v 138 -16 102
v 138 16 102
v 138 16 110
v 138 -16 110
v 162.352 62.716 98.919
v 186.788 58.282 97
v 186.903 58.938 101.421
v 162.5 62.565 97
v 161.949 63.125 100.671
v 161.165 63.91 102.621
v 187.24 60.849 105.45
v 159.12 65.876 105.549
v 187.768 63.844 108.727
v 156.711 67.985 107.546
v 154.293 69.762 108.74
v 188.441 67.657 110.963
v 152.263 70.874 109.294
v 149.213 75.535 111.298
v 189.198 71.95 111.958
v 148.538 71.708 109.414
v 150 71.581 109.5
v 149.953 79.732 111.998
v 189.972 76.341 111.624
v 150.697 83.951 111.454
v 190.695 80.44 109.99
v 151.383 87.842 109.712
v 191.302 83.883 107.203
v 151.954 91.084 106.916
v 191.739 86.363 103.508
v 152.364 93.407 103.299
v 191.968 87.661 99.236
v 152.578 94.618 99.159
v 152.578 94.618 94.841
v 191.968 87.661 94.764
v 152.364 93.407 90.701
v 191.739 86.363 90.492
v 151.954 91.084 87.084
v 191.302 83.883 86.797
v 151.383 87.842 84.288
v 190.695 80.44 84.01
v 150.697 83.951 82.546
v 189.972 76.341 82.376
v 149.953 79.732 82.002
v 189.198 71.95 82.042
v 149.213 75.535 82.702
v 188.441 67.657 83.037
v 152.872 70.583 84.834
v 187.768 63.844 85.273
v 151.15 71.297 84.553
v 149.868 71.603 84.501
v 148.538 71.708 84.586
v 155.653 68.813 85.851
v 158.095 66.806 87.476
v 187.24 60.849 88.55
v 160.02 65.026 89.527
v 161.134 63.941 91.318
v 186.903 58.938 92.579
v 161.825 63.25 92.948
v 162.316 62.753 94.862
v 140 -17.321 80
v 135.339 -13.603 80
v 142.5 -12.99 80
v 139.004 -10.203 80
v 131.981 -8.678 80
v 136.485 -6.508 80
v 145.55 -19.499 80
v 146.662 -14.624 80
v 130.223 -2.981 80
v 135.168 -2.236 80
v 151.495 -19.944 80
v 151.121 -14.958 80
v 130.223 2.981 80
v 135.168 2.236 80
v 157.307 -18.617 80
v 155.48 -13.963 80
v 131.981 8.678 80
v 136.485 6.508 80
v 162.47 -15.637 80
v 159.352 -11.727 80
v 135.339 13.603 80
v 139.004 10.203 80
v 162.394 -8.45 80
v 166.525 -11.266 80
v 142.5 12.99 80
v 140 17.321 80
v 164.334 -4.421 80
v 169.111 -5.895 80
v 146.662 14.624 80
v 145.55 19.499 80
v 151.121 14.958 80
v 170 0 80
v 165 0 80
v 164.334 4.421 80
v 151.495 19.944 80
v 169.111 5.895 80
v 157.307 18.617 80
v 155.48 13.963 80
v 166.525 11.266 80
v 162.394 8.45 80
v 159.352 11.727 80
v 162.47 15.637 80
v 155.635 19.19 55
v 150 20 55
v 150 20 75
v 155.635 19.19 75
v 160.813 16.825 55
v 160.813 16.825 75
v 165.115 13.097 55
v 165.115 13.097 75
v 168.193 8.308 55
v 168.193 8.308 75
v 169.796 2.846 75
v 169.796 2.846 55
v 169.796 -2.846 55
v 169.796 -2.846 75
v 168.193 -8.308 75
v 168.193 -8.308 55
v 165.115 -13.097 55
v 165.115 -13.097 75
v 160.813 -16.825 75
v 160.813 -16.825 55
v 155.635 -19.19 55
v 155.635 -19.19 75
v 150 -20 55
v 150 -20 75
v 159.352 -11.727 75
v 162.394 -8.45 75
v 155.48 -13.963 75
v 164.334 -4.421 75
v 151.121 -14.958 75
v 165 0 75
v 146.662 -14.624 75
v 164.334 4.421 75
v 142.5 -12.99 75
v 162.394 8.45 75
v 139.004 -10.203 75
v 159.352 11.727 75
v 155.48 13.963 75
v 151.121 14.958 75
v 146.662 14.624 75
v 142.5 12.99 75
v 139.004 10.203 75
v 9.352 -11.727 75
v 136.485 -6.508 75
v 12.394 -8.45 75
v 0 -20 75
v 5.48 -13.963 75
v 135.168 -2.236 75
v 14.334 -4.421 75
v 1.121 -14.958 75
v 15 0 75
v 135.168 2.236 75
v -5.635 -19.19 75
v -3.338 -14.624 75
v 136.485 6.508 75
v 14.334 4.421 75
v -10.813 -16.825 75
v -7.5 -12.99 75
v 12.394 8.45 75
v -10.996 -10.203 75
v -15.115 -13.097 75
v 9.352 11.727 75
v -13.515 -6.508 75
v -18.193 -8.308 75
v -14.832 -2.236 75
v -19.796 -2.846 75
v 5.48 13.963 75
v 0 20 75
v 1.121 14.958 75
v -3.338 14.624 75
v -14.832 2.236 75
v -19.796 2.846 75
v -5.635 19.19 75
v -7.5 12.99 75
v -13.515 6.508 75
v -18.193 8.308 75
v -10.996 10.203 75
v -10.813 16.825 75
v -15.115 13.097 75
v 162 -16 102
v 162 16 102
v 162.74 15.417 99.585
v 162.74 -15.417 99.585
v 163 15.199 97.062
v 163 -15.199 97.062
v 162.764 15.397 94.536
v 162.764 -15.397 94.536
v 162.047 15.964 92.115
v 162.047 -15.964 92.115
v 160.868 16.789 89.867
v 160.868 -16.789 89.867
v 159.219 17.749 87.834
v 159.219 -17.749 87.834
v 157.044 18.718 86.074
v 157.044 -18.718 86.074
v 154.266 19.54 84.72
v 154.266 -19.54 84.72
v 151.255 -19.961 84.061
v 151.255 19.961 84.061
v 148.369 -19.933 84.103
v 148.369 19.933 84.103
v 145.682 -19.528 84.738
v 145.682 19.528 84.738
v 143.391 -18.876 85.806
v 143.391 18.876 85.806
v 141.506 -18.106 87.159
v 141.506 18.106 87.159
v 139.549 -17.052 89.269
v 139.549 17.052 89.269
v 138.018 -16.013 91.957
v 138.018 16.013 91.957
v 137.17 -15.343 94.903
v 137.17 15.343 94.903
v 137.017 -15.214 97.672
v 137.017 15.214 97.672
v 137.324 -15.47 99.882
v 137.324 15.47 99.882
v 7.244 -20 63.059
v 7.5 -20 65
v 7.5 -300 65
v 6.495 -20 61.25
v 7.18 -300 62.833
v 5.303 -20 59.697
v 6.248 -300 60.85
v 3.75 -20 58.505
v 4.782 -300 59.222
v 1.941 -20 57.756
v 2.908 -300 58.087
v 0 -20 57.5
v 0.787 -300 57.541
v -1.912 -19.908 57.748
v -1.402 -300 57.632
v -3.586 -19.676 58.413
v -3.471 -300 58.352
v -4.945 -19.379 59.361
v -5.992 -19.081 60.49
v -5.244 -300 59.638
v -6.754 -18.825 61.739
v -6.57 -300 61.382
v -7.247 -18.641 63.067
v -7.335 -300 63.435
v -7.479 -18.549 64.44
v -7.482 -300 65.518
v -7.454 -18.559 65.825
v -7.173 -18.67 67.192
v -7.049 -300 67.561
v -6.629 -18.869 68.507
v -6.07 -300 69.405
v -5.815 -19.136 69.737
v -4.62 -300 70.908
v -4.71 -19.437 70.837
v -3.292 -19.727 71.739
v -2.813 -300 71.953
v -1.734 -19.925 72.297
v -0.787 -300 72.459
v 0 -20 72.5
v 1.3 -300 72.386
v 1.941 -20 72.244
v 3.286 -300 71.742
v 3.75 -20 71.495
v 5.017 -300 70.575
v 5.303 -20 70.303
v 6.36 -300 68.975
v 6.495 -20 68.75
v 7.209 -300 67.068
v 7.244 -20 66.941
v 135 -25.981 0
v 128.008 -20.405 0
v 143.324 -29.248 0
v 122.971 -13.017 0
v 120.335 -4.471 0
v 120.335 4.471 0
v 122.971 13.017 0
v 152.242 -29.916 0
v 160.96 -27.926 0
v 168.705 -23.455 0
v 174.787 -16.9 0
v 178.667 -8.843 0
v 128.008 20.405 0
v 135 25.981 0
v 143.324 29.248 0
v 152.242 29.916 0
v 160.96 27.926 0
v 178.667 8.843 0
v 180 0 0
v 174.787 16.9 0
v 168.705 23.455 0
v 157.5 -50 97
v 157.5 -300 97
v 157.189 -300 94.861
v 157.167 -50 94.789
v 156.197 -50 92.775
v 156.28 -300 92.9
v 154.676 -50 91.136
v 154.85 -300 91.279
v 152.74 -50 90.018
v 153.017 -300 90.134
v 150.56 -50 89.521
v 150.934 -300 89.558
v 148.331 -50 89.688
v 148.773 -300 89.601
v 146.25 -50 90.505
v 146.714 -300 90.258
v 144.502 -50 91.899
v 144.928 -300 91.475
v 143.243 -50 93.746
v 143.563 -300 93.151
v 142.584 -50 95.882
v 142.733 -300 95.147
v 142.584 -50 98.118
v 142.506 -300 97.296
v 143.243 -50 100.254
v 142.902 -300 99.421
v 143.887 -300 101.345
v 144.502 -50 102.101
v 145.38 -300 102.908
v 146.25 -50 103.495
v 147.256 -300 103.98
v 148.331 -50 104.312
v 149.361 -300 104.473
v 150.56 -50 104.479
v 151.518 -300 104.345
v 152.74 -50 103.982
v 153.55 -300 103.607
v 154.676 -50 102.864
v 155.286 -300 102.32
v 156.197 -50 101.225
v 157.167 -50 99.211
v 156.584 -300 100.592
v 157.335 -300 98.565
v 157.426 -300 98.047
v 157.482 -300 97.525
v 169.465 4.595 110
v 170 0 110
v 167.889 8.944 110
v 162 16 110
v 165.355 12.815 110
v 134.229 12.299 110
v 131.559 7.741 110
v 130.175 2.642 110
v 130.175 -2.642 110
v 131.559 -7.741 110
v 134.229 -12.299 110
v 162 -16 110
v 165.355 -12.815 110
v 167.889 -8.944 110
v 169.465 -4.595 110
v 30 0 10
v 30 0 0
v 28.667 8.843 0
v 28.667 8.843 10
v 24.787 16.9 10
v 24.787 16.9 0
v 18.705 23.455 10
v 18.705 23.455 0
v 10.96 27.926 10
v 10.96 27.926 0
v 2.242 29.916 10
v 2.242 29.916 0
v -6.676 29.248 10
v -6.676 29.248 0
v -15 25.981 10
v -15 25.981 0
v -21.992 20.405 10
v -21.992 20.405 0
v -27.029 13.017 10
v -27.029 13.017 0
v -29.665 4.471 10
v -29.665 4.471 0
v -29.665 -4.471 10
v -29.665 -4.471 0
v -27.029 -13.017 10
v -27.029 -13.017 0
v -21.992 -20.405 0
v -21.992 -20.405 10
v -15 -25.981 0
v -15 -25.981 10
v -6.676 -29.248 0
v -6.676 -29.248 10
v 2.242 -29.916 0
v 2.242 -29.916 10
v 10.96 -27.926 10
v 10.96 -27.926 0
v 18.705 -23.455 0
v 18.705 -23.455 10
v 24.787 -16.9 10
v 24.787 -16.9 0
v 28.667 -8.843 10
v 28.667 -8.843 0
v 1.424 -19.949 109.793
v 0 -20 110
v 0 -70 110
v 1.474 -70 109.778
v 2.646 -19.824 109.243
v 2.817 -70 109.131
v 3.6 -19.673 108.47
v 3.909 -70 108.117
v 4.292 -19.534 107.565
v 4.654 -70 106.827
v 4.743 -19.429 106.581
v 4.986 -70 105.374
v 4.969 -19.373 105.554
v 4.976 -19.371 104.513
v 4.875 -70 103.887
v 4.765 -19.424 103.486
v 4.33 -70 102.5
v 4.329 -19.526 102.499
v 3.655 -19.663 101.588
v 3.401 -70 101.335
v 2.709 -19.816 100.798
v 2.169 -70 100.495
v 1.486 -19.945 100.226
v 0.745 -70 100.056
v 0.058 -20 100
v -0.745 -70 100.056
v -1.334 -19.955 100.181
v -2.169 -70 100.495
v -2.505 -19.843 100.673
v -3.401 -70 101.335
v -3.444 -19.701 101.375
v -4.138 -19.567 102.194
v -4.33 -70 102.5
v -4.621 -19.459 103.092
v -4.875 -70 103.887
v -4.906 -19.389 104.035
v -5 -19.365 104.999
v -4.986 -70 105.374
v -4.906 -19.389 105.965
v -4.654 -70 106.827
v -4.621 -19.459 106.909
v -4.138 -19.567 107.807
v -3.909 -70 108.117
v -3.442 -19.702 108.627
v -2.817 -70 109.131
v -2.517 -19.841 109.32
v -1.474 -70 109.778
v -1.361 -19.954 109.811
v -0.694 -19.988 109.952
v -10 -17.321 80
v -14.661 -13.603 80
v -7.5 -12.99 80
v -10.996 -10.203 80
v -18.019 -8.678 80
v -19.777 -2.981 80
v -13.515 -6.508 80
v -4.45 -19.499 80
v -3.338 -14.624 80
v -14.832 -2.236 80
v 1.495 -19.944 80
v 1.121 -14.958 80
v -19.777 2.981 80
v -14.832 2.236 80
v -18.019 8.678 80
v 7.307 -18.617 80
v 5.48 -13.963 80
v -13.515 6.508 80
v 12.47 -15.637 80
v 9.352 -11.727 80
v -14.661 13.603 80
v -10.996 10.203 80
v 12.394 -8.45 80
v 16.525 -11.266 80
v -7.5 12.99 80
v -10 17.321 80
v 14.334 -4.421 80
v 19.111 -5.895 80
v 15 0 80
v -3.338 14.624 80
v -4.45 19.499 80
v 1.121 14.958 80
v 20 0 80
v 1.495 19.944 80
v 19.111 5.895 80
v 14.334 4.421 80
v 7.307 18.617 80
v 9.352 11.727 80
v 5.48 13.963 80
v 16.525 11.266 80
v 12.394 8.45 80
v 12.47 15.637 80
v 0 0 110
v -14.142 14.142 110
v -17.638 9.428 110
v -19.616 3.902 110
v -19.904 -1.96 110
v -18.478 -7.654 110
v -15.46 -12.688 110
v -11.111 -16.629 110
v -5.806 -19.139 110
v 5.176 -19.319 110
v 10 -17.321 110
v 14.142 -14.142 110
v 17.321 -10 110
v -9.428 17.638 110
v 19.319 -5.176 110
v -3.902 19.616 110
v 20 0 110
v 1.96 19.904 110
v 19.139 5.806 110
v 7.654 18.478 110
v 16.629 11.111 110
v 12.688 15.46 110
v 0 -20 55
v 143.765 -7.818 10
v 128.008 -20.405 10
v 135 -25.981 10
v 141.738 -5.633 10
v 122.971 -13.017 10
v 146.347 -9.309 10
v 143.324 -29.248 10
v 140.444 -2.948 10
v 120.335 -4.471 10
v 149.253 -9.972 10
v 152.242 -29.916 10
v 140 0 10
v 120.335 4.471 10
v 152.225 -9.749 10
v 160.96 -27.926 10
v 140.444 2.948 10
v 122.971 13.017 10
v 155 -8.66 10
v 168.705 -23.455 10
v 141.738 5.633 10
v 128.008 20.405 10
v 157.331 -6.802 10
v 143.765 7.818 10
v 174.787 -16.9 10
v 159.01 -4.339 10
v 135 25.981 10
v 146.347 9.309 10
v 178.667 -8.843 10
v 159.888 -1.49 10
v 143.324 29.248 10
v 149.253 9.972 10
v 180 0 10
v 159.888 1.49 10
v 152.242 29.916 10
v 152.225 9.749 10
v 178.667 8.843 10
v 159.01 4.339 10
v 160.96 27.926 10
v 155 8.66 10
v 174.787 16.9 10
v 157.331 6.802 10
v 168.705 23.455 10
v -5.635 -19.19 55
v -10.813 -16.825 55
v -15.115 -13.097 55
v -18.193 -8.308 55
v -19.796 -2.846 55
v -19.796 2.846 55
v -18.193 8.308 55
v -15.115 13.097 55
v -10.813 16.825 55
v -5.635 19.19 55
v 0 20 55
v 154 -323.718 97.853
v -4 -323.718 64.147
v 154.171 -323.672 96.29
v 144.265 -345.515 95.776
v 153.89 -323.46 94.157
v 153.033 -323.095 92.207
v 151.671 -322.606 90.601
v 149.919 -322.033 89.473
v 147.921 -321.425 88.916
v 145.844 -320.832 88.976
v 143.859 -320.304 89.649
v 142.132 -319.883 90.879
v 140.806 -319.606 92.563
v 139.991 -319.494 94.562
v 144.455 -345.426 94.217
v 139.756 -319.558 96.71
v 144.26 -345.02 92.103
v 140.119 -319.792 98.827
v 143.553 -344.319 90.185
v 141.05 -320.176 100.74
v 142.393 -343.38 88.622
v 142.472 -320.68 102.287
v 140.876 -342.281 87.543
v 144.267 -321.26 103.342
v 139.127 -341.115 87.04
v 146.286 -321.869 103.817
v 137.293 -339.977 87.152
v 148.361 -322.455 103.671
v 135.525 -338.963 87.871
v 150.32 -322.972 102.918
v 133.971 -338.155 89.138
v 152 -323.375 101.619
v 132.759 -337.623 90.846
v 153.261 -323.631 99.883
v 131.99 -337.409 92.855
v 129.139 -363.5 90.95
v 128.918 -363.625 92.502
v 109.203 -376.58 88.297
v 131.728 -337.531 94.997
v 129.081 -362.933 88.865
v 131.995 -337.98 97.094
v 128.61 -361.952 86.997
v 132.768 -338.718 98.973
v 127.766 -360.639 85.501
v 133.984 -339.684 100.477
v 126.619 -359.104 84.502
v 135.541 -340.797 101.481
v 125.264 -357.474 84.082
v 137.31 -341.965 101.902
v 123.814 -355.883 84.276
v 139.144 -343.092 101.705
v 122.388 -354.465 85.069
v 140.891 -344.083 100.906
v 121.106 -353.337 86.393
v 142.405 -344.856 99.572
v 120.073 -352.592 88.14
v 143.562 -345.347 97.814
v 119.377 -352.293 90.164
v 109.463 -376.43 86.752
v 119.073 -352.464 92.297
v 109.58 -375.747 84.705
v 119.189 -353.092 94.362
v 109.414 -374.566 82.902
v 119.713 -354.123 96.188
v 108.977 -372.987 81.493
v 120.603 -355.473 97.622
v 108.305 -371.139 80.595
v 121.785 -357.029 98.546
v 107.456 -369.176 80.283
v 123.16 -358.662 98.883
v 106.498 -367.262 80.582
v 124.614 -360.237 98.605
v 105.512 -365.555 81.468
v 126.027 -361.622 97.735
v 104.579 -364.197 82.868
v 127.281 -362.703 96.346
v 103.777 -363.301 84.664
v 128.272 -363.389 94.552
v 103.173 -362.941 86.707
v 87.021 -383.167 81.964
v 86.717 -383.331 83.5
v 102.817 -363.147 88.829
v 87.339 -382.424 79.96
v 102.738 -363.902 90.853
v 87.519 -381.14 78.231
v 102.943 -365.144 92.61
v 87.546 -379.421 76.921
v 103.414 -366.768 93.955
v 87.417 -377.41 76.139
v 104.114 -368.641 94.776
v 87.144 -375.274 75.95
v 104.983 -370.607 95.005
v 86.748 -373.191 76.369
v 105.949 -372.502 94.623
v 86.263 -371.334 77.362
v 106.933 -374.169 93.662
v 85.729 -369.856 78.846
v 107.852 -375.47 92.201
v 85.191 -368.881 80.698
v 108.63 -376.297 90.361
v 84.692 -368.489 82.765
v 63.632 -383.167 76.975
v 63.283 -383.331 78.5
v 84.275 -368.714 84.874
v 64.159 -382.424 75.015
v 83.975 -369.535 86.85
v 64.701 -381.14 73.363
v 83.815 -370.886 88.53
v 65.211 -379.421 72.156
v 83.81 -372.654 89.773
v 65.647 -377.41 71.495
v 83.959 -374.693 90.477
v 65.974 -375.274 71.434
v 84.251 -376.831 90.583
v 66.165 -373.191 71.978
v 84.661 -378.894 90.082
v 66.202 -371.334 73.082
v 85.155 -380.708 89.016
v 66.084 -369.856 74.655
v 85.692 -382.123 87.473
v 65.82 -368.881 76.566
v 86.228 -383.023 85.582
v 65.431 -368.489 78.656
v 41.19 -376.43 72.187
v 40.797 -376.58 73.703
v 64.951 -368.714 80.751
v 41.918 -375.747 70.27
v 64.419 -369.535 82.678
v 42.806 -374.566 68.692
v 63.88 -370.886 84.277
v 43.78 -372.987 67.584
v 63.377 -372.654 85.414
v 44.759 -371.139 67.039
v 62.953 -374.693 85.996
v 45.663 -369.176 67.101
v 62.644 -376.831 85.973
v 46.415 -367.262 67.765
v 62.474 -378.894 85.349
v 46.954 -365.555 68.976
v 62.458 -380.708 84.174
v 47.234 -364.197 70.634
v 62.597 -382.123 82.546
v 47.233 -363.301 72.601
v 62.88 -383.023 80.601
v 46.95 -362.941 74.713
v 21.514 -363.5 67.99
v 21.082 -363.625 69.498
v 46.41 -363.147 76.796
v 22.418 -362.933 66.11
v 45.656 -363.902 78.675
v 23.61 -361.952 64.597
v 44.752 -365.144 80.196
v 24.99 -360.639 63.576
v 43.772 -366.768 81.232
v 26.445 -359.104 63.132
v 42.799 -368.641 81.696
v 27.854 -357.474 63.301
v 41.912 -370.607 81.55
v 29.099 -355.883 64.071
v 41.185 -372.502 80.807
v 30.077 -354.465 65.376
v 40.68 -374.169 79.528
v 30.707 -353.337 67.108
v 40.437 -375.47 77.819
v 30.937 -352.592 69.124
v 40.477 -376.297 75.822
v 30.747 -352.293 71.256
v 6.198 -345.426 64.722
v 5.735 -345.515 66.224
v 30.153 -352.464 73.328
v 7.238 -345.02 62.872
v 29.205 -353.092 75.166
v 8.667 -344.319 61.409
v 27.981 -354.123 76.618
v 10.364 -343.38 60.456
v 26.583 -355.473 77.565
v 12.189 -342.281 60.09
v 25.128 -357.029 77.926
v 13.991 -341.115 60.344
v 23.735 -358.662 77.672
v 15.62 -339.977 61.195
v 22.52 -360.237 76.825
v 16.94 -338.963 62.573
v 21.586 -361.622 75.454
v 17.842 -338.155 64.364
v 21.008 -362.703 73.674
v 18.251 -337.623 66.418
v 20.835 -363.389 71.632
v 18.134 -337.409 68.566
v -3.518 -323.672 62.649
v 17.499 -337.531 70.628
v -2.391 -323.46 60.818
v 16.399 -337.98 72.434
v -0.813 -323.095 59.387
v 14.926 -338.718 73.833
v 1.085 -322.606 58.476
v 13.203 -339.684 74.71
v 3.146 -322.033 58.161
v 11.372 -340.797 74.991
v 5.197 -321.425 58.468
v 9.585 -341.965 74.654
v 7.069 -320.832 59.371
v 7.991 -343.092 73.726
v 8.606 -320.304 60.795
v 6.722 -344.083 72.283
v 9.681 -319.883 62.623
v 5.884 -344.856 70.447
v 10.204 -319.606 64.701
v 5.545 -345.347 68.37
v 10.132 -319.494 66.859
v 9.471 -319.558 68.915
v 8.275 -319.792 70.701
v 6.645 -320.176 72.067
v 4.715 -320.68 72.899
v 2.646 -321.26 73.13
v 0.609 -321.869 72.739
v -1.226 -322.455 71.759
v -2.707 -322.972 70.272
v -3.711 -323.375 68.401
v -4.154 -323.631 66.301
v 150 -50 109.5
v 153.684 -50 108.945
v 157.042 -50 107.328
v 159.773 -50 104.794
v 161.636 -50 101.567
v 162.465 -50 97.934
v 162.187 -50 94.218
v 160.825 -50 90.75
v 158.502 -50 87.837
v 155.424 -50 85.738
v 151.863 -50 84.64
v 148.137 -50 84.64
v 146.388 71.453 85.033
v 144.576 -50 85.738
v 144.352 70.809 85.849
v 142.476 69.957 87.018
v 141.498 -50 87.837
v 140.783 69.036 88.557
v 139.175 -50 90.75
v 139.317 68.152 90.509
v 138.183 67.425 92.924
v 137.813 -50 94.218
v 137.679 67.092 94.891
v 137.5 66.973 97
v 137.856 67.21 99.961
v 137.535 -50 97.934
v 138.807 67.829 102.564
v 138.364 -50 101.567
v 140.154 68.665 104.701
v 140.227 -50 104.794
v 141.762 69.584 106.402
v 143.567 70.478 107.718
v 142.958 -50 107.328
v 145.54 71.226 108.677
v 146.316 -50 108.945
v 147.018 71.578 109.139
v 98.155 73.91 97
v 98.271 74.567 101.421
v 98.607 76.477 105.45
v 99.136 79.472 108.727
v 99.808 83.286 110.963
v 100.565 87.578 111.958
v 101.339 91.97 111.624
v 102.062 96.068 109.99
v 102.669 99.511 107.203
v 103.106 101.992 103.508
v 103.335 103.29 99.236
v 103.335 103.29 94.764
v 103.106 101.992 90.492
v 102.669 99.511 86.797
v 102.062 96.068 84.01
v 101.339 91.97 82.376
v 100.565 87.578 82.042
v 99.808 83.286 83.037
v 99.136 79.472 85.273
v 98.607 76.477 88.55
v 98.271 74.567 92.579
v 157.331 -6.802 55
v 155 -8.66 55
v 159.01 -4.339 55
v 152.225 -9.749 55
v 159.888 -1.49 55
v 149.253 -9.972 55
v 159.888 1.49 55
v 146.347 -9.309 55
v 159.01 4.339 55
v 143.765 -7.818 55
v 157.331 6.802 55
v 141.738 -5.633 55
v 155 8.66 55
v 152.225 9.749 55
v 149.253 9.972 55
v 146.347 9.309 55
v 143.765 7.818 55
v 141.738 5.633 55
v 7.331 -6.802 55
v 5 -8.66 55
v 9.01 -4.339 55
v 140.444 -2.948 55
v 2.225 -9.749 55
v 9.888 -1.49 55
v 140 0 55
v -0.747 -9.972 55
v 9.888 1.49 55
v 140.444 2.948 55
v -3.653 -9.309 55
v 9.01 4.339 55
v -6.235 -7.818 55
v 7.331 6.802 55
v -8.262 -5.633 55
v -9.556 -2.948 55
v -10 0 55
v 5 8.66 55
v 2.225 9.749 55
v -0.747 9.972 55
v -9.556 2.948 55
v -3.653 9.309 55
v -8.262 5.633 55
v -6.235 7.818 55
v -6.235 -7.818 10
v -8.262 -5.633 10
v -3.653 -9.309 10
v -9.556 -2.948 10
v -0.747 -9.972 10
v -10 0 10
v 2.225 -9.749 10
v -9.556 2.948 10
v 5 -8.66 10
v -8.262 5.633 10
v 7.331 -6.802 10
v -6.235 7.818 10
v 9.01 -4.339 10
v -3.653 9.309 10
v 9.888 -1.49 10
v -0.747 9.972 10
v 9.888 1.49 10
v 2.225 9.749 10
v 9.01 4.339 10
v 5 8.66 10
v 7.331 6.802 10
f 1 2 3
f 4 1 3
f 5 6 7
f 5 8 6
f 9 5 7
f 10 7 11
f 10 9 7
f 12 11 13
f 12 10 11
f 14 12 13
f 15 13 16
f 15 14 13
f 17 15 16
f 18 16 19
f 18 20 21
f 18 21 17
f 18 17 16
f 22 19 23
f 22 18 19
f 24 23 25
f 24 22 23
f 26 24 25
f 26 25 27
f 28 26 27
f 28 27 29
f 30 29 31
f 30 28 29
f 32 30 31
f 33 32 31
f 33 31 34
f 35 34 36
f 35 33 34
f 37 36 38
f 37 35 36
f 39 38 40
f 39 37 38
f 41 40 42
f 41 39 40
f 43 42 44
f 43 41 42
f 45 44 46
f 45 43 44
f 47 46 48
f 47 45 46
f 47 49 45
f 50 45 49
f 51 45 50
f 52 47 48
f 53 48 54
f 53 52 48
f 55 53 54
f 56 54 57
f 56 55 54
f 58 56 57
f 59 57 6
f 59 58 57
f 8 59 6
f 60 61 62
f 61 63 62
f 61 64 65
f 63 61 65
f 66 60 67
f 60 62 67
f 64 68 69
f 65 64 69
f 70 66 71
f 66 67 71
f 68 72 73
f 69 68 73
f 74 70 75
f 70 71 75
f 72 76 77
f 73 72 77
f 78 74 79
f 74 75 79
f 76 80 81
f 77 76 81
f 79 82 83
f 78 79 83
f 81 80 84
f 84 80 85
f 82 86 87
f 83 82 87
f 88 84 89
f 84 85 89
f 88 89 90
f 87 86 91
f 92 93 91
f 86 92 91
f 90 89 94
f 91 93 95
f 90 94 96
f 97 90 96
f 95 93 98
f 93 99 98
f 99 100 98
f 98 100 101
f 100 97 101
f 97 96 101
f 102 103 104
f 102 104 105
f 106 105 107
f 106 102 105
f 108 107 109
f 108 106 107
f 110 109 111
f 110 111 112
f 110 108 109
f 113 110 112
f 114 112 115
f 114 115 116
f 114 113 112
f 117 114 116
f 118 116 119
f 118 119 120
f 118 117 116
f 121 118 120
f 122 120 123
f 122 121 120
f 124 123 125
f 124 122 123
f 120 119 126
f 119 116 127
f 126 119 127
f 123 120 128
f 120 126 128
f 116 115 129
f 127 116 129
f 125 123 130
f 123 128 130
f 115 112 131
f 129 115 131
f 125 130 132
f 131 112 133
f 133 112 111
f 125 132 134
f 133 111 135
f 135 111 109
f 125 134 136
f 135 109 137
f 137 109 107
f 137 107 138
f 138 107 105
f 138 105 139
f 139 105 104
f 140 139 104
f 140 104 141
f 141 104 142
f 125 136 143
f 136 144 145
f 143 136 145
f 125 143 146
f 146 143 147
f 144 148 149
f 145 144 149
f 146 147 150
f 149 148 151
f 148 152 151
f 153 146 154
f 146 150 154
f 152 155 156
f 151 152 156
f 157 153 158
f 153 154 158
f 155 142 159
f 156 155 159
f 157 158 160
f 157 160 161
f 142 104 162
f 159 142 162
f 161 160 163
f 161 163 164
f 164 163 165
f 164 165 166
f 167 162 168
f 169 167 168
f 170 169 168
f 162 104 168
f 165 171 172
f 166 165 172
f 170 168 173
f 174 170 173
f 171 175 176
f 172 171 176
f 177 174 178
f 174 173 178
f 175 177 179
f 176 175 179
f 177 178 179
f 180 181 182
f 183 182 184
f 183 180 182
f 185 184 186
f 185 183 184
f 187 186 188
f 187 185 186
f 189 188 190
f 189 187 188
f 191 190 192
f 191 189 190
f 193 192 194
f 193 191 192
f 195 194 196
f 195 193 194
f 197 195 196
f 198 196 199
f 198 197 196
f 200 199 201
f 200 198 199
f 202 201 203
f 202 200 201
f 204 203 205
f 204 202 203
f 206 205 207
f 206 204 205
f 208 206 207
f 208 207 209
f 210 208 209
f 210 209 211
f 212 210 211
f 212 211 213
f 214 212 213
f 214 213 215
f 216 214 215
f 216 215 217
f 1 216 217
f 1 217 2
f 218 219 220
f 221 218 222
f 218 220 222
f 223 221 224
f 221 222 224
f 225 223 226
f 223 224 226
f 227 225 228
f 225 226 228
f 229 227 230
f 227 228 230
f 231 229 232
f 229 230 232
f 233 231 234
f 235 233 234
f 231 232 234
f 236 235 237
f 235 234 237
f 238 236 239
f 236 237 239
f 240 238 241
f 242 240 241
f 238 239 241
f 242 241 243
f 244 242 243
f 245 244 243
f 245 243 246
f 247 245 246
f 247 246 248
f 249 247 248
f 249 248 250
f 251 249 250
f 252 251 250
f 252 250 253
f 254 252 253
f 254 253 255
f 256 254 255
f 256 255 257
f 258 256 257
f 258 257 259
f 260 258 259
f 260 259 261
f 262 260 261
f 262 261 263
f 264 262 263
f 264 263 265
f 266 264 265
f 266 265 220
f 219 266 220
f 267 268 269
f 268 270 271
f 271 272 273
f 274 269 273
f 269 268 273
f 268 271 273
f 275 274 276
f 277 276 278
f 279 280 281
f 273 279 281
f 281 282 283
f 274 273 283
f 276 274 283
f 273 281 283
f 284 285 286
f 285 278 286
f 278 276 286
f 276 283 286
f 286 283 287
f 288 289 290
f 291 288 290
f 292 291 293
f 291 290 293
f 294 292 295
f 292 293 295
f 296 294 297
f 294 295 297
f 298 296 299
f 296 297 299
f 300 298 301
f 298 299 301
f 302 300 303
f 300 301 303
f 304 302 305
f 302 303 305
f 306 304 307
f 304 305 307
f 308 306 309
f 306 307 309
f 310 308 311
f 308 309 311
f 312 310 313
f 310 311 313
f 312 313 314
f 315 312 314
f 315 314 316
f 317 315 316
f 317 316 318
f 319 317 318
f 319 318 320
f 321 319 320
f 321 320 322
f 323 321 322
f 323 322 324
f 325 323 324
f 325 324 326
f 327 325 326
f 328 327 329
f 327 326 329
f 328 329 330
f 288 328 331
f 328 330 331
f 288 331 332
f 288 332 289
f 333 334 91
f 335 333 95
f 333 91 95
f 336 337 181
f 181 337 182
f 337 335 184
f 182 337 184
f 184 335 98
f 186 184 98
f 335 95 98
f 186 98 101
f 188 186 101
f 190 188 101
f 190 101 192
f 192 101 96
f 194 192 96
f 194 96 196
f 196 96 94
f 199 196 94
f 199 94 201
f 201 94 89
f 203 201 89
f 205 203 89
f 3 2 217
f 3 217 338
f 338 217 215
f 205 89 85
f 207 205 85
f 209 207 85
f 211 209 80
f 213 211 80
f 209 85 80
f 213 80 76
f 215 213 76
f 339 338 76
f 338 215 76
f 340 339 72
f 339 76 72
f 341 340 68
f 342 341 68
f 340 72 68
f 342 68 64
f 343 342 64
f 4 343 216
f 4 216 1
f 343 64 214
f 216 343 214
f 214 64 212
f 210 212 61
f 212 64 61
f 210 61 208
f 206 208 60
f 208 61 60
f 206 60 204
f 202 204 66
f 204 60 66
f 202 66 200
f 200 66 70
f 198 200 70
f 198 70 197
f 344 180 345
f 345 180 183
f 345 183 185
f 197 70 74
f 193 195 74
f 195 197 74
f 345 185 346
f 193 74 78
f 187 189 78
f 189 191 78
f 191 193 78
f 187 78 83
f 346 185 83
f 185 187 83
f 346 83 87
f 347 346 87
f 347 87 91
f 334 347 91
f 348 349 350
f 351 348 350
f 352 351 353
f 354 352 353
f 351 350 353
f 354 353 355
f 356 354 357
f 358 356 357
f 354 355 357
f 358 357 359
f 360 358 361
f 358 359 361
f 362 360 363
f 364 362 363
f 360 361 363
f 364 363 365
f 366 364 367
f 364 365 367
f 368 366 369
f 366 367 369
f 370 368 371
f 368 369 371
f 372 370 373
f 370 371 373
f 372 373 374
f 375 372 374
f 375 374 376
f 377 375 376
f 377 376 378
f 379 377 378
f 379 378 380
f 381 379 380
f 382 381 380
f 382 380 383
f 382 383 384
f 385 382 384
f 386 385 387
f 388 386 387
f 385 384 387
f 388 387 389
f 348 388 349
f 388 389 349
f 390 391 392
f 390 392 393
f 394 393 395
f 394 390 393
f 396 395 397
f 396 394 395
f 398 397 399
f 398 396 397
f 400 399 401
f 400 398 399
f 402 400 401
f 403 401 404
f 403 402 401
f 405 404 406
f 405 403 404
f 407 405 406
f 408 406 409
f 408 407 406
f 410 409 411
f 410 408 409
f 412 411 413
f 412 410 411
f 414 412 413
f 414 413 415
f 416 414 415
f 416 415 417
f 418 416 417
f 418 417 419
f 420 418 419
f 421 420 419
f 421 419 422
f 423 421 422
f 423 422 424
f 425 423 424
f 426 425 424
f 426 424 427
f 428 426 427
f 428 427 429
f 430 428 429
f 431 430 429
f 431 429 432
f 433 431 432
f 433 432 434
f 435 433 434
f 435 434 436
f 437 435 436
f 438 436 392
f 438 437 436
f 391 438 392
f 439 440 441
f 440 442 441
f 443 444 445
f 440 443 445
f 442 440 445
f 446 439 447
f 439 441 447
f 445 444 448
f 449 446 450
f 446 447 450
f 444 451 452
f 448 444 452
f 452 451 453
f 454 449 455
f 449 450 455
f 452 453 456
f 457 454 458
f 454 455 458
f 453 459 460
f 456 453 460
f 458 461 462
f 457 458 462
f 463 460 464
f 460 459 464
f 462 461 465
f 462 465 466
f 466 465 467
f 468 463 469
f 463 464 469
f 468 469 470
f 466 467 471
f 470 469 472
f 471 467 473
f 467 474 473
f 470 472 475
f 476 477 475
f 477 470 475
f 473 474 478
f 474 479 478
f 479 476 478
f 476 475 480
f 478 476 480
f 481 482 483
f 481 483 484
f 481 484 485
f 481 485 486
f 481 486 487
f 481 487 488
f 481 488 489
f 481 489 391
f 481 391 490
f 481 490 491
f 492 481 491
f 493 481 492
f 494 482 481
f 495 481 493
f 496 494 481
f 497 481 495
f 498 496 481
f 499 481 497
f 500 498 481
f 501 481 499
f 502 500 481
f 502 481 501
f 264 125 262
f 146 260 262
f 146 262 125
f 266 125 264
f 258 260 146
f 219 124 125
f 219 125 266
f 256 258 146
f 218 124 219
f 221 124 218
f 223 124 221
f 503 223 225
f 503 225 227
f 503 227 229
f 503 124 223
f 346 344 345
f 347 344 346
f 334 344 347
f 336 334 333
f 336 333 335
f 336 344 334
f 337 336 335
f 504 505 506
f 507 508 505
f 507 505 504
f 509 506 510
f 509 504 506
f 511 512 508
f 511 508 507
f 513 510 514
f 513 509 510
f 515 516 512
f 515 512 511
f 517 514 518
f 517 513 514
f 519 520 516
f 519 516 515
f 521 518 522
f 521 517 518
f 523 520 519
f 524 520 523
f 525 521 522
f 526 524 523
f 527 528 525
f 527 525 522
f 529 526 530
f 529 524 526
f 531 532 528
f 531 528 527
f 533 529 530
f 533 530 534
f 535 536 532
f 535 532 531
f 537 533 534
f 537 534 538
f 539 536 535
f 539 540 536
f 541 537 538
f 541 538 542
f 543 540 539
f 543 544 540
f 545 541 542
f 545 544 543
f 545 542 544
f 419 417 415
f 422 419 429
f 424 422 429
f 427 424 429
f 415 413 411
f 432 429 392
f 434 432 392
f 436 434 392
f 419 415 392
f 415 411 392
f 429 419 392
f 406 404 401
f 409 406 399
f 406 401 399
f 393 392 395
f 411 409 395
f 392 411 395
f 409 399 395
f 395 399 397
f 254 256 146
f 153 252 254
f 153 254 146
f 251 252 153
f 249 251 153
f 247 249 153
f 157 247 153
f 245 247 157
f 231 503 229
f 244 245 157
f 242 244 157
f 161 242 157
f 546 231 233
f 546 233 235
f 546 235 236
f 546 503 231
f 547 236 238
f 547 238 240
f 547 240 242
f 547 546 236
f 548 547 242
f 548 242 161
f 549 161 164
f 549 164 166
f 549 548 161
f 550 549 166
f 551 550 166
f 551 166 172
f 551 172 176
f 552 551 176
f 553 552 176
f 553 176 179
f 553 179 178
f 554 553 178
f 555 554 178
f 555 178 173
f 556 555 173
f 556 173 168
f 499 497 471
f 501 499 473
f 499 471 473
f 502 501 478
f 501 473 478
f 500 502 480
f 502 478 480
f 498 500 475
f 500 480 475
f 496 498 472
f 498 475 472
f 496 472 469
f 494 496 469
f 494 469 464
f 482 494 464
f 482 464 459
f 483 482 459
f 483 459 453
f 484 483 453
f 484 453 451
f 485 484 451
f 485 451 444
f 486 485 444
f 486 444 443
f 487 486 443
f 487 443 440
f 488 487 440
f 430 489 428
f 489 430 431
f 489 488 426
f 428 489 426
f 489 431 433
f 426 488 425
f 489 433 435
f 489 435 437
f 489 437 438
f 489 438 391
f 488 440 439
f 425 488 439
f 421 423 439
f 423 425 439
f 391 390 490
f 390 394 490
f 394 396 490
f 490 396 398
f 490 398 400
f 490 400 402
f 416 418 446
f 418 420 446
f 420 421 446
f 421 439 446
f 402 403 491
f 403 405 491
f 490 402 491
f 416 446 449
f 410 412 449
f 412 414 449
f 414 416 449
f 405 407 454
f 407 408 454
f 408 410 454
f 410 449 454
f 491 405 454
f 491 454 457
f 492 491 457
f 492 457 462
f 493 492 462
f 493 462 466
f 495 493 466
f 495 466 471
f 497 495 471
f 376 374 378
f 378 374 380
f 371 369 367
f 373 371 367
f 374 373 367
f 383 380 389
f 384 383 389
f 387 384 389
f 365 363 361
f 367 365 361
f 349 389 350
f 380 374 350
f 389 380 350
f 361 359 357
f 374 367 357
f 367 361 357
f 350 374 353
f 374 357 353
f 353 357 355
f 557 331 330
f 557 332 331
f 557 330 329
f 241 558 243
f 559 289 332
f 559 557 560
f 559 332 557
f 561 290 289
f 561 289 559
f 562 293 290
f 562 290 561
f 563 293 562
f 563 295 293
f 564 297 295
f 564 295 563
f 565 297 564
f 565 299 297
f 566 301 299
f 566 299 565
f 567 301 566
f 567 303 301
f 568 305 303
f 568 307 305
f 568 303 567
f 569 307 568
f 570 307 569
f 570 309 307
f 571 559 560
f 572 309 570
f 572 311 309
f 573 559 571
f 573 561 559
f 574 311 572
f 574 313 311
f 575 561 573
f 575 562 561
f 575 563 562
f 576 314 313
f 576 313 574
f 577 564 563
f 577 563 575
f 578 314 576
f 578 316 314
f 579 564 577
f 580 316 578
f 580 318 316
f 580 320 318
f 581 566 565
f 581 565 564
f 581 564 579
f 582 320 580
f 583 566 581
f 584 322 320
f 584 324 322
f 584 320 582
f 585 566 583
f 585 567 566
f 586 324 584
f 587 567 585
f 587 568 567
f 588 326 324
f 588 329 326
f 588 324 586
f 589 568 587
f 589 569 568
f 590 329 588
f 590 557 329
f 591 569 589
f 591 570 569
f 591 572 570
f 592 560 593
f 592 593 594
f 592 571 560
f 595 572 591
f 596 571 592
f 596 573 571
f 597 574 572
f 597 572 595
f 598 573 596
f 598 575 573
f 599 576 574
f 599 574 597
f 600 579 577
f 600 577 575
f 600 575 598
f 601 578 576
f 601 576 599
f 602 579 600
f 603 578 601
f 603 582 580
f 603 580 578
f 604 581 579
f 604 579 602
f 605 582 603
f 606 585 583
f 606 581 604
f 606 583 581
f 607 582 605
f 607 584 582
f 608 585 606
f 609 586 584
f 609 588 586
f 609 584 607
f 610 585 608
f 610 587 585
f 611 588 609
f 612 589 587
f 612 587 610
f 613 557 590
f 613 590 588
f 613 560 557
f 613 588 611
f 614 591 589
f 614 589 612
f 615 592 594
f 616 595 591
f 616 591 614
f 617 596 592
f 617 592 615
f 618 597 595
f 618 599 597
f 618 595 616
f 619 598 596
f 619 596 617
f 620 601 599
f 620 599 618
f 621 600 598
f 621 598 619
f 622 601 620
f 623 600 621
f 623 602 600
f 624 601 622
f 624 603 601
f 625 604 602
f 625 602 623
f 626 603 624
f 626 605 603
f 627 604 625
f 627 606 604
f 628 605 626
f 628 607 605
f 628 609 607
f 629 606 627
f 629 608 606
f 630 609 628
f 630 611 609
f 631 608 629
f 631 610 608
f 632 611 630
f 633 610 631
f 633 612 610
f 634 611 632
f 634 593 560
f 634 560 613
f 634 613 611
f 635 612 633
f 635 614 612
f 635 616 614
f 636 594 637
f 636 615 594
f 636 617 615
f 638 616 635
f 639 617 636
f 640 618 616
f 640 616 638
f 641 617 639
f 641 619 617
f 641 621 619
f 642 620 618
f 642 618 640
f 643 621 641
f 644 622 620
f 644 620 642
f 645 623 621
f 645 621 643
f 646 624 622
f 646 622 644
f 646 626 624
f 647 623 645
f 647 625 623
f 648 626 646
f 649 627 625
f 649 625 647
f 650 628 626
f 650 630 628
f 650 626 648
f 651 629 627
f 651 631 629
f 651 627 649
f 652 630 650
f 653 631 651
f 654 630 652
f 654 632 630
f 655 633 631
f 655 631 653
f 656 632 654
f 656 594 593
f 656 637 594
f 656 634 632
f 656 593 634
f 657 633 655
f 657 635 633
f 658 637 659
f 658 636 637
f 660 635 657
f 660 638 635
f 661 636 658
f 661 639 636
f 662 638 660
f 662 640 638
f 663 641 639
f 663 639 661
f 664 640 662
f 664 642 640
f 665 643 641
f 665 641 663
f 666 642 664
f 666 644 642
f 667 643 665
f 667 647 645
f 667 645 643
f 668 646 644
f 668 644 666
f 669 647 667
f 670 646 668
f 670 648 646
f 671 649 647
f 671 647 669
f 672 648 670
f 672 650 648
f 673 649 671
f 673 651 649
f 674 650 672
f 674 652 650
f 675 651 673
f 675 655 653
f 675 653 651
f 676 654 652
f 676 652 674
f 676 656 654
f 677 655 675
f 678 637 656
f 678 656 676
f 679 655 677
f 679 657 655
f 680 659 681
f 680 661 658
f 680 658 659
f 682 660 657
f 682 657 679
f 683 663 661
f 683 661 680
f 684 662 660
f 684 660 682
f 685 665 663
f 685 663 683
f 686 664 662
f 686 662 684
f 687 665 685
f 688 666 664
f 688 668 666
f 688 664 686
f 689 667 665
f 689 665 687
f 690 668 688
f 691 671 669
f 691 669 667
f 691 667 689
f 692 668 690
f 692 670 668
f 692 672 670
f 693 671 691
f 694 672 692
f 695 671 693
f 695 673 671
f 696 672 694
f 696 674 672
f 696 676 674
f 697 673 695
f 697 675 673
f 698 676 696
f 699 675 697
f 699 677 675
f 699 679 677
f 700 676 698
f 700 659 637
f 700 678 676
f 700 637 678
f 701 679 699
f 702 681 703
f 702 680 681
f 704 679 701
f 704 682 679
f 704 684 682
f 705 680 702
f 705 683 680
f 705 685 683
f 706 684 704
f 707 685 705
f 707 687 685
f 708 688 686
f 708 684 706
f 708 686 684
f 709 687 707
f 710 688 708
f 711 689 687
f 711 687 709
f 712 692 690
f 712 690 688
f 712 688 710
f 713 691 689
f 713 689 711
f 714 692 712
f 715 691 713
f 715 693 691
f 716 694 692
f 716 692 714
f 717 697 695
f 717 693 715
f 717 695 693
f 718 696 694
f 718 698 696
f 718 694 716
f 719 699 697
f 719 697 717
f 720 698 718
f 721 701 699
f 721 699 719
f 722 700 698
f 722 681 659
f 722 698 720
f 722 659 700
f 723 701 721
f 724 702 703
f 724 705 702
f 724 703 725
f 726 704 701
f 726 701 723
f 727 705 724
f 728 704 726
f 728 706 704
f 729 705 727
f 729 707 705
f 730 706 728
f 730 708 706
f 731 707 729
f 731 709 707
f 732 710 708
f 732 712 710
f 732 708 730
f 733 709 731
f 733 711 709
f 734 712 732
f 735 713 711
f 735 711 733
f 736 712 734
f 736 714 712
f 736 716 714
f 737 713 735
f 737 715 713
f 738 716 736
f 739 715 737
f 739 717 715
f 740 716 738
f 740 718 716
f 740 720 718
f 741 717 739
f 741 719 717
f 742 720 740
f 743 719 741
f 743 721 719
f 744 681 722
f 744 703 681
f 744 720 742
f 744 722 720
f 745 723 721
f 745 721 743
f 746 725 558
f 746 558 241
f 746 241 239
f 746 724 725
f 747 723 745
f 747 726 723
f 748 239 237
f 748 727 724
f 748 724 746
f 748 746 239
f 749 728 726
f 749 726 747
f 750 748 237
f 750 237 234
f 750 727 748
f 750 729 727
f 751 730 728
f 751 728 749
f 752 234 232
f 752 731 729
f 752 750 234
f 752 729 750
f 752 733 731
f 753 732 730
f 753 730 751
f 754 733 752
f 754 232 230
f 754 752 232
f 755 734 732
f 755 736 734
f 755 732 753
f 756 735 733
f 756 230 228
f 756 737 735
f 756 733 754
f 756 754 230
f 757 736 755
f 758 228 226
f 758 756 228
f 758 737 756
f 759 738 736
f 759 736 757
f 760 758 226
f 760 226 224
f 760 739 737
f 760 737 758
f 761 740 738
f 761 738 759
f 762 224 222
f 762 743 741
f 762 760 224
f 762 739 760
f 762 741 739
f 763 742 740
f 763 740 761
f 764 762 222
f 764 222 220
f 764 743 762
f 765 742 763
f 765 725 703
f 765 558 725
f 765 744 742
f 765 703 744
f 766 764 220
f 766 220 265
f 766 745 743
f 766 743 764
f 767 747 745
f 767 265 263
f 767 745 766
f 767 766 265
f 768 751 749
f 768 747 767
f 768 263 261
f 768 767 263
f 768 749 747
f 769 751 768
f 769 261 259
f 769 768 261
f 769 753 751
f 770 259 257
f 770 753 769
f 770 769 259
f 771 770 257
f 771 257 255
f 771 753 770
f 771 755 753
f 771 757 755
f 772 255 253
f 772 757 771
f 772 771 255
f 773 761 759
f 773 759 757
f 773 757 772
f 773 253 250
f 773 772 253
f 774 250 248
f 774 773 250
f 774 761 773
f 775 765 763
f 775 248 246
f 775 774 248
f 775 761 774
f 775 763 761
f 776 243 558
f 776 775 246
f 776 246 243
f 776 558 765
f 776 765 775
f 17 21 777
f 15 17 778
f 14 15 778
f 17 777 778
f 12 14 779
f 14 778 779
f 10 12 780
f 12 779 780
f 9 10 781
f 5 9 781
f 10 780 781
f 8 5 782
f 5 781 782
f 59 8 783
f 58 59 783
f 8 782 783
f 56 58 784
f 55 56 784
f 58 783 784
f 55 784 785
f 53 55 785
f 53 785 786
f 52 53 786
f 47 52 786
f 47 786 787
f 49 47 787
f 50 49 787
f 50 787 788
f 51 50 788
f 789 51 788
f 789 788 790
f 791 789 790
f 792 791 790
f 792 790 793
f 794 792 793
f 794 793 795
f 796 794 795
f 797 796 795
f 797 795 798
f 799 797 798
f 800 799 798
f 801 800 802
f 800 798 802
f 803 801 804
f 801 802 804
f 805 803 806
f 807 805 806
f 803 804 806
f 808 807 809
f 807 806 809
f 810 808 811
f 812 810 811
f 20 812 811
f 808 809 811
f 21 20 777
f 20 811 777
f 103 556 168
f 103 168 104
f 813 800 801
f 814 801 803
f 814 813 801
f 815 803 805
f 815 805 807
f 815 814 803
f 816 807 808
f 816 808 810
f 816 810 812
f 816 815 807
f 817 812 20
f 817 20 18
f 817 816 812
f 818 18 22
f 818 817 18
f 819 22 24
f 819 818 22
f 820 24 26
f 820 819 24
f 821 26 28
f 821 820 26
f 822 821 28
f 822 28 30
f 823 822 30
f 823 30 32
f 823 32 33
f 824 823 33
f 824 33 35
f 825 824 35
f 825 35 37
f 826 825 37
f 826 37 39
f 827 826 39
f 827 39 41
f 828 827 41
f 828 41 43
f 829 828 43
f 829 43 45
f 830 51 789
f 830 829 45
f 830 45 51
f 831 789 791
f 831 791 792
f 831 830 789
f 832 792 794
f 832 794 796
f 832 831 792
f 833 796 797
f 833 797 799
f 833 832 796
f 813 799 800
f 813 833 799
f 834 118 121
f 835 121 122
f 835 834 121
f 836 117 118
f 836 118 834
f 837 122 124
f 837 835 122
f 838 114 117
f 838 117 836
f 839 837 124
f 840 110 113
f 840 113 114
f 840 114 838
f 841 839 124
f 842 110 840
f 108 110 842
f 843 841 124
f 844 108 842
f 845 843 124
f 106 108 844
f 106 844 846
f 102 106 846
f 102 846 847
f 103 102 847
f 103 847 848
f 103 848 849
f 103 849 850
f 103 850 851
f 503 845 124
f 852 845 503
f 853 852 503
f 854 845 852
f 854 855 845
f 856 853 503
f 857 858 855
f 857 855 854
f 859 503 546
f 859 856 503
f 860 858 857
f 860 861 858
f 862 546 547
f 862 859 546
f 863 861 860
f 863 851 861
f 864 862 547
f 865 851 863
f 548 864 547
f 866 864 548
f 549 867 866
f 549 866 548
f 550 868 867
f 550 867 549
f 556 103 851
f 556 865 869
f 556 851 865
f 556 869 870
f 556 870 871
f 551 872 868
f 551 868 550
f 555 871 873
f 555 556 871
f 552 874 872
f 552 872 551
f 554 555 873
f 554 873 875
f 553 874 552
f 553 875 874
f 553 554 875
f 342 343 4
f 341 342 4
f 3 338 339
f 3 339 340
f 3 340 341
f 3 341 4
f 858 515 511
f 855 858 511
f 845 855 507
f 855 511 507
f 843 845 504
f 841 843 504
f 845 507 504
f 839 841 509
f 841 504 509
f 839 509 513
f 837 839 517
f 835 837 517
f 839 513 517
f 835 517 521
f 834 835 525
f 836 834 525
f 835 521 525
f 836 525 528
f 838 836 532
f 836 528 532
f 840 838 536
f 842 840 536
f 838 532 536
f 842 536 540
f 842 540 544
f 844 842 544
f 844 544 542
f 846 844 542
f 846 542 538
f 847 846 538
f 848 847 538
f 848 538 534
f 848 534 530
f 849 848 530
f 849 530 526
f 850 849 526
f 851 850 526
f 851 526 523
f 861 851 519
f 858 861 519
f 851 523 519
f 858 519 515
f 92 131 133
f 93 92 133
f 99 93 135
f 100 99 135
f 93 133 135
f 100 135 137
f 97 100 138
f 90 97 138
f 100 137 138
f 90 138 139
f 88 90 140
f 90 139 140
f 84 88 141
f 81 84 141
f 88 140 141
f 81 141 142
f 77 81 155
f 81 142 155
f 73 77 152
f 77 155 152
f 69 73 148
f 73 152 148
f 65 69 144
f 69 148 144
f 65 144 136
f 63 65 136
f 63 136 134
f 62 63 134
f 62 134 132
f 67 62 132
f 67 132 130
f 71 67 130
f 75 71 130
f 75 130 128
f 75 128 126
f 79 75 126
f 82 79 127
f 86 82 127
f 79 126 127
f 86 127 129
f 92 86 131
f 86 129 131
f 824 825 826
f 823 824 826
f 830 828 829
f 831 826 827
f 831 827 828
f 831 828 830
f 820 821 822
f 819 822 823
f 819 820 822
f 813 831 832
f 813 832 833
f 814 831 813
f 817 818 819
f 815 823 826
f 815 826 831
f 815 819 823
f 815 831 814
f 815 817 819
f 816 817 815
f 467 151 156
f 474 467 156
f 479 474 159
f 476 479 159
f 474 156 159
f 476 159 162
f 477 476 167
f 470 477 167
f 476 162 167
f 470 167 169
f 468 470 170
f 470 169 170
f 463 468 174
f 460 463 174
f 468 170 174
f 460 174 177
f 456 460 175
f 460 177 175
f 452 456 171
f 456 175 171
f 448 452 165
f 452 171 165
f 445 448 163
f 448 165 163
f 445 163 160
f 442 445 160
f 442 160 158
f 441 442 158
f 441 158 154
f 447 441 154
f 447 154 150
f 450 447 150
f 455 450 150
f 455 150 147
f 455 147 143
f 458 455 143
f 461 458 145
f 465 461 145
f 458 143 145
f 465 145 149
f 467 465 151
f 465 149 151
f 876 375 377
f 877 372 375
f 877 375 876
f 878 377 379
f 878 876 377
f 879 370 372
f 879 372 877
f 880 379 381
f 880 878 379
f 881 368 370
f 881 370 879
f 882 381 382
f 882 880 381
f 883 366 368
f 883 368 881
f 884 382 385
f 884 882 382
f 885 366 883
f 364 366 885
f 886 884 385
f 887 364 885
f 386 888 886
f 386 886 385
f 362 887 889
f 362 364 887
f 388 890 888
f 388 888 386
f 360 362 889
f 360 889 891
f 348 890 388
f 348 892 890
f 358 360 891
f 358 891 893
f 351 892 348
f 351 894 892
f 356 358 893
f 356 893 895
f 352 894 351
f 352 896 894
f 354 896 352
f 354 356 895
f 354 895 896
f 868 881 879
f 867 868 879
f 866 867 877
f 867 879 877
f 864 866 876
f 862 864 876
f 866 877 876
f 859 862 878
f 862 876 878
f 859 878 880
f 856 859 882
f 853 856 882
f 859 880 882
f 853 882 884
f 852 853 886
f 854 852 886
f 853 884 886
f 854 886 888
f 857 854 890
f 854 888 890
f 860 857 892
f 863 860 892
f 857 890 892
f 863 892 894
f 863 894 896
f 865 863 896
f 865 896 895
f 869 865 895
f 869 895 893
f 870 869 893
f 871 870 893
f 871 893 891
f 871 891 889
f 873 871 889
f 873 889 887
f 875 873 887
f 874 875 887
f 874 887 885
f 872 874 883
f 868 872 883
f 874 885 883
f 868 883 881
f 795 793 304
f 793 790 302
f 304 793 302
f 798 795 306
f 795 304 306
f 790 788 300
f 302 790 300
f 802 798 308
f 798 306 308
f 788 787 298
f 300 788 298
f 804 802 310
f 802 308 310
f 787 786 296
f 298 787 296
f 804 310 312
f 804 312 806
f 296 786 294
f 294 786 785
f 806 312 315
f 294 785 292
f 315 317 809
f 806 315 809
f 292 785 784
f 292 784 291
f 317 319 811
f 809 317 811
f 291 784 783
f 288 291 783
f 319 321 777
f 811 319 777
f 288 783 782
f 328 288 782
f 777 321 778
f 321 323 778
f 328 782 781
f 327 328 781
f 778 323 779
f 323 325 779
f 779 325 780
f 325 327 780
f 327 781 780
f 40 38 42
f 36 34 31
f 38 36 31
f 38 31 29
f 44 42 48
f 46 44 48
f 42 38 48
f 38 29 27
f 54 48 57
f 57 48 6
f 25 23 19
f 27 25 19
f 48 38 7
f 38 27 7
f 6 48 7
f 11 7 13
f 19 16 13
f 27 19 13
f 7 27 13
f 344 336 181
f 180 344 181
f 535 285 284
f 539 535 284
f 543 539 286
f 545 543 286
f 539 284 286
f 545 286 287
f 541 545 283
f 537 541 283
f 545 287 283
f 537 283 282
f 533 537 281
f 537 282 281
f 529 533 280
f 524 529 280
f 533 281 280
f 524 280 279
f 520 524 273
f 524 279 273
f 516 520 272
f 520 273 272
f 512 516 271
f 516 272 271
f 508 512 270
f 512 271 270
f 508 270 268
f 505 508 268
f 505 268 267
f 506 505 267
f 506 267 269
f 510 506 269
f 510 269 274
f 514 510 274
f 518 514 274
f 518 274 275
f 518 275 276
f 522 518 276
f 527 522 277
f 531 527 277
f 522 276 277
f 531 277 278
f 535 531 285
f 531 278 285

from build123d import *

# Parameters (mm, degrees)
SKETCH_1_R               = 30
EXTRUDE_1_DEPTH          = 10
EXTRUDE_1_2_DEPTH        = 10
SKETCH_2_R               = 10
EXTRUDE_2_DEPTH          = 45
EXTRUDE_3_DEPTH          = 20
SKETCH_4_R               = 15
EXTRUDE_4_DEPTH          = 5
SKETCH_5_R               = 20
EXTRUDE_5_DEPTH          = 30
SKETCH_6_R               = 5
EXTRUDE_6_DEPTH          = 70
CUT_EXTRUDE_1_DEPTH      = 223.26110779
CUT_EXTRUDE_1_DEPTH_BACK = 223.26110779
SKETCH_9_R               = 7.5
EXTRUDE_7_DEPTH          = 50
SWEEP_START              = -300.0000001
SWEEP_1_OUTLINE_R        = 7.5
SWEEP_1_DEPTH            = 300.0000001
SWEEP_1_2_OUTLINE_R      = 7.5
SWEEP_1_2_ANGLE          = 180
EXTRUDE_8_DEPTH          = 80
EXTRUDE_8_DEPTH_BACK     = 50
SKETCH_10_R              = 12.5
SWEEP_2_PROFILE_R        = 15


with BuildPart() as part:
    # Эскиз1 → Бобышка-Вытянуть1 (new body)
    with BuildSketch(Plane.XY):
        Circle(SKETCH_1_R)
    extrude(amount=EXTRUDE_1_DEPTH)



with BuildPart() as body_2:
    # Эскиз1 → Extrude 1 2 (new body)
    with BuildSketch(Plane.XY):
        with Locations((150, 0)):
            Circle(SKETCH_1_R)
    extrude(amount=EXTRUDE_1_2_DEPTH)


with BuildPart() as part_1:
    add(part.part)

    add(body_2.part)  # Бобышка-Вытянуть2 merges body 2
    # Эскиз2 → Бобышка-Вытянуть2 (add)
    with BuildSketch(Plane.XY.offset(10)):
        with Locations(Location((0, 0, 0), (0, 0, 180))):
            Circle(SKETCH_2_R)
        with Locations(Location((150, 0, 0), (0, 0, 180))):
            Circle(SKETCH_2_R)
    extrude(amount=EXTRUDE_2_DEPTH)

    # Эскиз3 → Бобышка-Вытянуть3 (add)
    with BuildSketch(Plane.XY.offset(55)):
        with BuildLine():
            Line((0, 20), (150, 20))
            ThreePointArc((150, 20), (170, 0), (150, -20))
            Line((150, -20), (0, -20))
            ThreePointArc((0, -20), (-20, 0), (0, 20))
        make_face()
    extrude(amount=EXTRUDE_3_DEPTH)

    # Эскиз4 → Бобышка-Вытянуть4 (add)
    with BuildSketch(Plane.XY.offset(75)):
        Circle(SKETCH_4_R)
        with Locations((150, 0)):
            Circle(SKETCH_4_R)
    extrude(amount=EXTRUDE_4_DEPTH)

    # Эскиз5 → Бобышка-Вытянуть5 (add)
    with BuildSketch(Plane.XY.offset(80)):
        Circle(SKETCH_5_R)
        with Locations((150, 0)):
            Circle(SKETCH_5_R)
    extrude(amount=EXTRUDE_5_DEPTH)

    # Эскиз6 → Бобышка-Вытянуть6 (add)
    with BuildSketch(Plane(origin=(0, 0, 0), x_dir=(1, 0, 0), z_dir=(0, 1, 0))):
        with Locations(Location((0, -105, 0), (0, 0, 270))):
            Circle(SKETCH_6_R)
    extrude(amount=-EXTRUDE_6_DEPTH)

    # Эскиз8 → Вырез-Вытянуть1 (cut, two sides: drawn at the far end of the back side and taken through both)
    with BuildSketch(Plane(origin=(0, 0, 0), x_dir=(1, 0, 0), z_dir=(0, 1, 0)).offset(-CUT_EXTRUDE_1_DEPTH_BACK)):
        with BuildLine():
            Line((138, -102), (138, -110))
            Line((138, -110), (162, -110))
            Line((162, -110), (162, -102))
            ThreePointArc((162, -102), (150, -84), (138, -102))
        make_face()
    extrude(amount=CUT_EXTRUDE_1_DEPTH + CUT_EXTRUDE_1_DEPTH_BACK, mode=Mode.SUBTRACT)

    # Эскиз9 → Бобышка-Вытянуть7 (add)
    with BuildSketch(Plane(origin=(0, 0, 0), x_dir=(1, 0, 0), z_dir=(0, 1, 0))):
        with Locations(Location((0, -65, 0), (0, 0, 270))):
            Circle(SKETCH_9_R)
    extrude(amount=-EXTRUDE_7_DEPTH)

    # По траектории1: read off the stored shape, not the designer's step
    # По траектории1 outline → По траектории1 (add)
    with BuildSketch(Plane(origin=(0, 0, 0), x_dir=(1, 0, 0), z_dir=(0, 1, 0)).offset(SWEEP_START)):
        with Locations((0, -65)):
            Circle(SWEEP_1_OUTLINE_R)
        with Locations((150, -97)):
            Circle(SWEEP_1_OUTLINE_R)
    extrude(amount=SWEEP_1_DEPTH)

    # Sweep 1 2 outline → Sweep 1 2 (revolve)
    with BuildSketch(Plane(origin=(88.263050502, -300, 18.829450774), x_dir=(0.9779928364243075, 0, 0.20863847177051914), z_dir=(0, 1, 0))):
        with Locations((76.68767828, -63.569534368)):
            Circle(SWEEP_1_2_OUTLINE_R)
    revolve(axis=Axis((88.263050502, -300, 18.829450774), (0.20863847177051914, 0, -0.9779928364243075)), revolution_arc=SWEEP_1_2_ANGLE)

    # Эскиз10 → Бобышка-Вытянуть8 (add, two sides: drawn at the far end of the back side and taken through both)
    with BuildSketch(Plane(origin=(0, 0, 0), x_dir=(1, 0, 0), z_dir=(0, 1, 0)).offset(-EXTRUDE_8_DEPTH_BACK)):
        with Locations(Location((150, -97, 0), (0, 0, 270))):
            Circle(SKETCH_10_R)
    extrude(amount=EXTRUDE_8_DEPTH + EXTRUDE_8_DEPTH_BACK)

    # По траектории2: sweep along a path in Эскиз11
    with BuildLine(Plane.XY.offset(97)) as sweep_2_path:
        Line((189.39231012, 73.054072893), (150, 80))
        Line((150, 80), (100.759612349, 88.682408883))
    # По траектории2 profile (on start of the path) → По траектории2 (sweep)
    with BuildSketch(Plane(origin=(189.39231012, 73.054072893, 97), x_dir=(-0.17364817766693041, -0.9848077530122081, 0), z_dir=(-0.9848077530122081, 0.17364817766693041, 0))):
        Circle(SWEEP_2_PROFILE_R)
    sweep(path=sweep_2_path.line)


solid = part_1.part
